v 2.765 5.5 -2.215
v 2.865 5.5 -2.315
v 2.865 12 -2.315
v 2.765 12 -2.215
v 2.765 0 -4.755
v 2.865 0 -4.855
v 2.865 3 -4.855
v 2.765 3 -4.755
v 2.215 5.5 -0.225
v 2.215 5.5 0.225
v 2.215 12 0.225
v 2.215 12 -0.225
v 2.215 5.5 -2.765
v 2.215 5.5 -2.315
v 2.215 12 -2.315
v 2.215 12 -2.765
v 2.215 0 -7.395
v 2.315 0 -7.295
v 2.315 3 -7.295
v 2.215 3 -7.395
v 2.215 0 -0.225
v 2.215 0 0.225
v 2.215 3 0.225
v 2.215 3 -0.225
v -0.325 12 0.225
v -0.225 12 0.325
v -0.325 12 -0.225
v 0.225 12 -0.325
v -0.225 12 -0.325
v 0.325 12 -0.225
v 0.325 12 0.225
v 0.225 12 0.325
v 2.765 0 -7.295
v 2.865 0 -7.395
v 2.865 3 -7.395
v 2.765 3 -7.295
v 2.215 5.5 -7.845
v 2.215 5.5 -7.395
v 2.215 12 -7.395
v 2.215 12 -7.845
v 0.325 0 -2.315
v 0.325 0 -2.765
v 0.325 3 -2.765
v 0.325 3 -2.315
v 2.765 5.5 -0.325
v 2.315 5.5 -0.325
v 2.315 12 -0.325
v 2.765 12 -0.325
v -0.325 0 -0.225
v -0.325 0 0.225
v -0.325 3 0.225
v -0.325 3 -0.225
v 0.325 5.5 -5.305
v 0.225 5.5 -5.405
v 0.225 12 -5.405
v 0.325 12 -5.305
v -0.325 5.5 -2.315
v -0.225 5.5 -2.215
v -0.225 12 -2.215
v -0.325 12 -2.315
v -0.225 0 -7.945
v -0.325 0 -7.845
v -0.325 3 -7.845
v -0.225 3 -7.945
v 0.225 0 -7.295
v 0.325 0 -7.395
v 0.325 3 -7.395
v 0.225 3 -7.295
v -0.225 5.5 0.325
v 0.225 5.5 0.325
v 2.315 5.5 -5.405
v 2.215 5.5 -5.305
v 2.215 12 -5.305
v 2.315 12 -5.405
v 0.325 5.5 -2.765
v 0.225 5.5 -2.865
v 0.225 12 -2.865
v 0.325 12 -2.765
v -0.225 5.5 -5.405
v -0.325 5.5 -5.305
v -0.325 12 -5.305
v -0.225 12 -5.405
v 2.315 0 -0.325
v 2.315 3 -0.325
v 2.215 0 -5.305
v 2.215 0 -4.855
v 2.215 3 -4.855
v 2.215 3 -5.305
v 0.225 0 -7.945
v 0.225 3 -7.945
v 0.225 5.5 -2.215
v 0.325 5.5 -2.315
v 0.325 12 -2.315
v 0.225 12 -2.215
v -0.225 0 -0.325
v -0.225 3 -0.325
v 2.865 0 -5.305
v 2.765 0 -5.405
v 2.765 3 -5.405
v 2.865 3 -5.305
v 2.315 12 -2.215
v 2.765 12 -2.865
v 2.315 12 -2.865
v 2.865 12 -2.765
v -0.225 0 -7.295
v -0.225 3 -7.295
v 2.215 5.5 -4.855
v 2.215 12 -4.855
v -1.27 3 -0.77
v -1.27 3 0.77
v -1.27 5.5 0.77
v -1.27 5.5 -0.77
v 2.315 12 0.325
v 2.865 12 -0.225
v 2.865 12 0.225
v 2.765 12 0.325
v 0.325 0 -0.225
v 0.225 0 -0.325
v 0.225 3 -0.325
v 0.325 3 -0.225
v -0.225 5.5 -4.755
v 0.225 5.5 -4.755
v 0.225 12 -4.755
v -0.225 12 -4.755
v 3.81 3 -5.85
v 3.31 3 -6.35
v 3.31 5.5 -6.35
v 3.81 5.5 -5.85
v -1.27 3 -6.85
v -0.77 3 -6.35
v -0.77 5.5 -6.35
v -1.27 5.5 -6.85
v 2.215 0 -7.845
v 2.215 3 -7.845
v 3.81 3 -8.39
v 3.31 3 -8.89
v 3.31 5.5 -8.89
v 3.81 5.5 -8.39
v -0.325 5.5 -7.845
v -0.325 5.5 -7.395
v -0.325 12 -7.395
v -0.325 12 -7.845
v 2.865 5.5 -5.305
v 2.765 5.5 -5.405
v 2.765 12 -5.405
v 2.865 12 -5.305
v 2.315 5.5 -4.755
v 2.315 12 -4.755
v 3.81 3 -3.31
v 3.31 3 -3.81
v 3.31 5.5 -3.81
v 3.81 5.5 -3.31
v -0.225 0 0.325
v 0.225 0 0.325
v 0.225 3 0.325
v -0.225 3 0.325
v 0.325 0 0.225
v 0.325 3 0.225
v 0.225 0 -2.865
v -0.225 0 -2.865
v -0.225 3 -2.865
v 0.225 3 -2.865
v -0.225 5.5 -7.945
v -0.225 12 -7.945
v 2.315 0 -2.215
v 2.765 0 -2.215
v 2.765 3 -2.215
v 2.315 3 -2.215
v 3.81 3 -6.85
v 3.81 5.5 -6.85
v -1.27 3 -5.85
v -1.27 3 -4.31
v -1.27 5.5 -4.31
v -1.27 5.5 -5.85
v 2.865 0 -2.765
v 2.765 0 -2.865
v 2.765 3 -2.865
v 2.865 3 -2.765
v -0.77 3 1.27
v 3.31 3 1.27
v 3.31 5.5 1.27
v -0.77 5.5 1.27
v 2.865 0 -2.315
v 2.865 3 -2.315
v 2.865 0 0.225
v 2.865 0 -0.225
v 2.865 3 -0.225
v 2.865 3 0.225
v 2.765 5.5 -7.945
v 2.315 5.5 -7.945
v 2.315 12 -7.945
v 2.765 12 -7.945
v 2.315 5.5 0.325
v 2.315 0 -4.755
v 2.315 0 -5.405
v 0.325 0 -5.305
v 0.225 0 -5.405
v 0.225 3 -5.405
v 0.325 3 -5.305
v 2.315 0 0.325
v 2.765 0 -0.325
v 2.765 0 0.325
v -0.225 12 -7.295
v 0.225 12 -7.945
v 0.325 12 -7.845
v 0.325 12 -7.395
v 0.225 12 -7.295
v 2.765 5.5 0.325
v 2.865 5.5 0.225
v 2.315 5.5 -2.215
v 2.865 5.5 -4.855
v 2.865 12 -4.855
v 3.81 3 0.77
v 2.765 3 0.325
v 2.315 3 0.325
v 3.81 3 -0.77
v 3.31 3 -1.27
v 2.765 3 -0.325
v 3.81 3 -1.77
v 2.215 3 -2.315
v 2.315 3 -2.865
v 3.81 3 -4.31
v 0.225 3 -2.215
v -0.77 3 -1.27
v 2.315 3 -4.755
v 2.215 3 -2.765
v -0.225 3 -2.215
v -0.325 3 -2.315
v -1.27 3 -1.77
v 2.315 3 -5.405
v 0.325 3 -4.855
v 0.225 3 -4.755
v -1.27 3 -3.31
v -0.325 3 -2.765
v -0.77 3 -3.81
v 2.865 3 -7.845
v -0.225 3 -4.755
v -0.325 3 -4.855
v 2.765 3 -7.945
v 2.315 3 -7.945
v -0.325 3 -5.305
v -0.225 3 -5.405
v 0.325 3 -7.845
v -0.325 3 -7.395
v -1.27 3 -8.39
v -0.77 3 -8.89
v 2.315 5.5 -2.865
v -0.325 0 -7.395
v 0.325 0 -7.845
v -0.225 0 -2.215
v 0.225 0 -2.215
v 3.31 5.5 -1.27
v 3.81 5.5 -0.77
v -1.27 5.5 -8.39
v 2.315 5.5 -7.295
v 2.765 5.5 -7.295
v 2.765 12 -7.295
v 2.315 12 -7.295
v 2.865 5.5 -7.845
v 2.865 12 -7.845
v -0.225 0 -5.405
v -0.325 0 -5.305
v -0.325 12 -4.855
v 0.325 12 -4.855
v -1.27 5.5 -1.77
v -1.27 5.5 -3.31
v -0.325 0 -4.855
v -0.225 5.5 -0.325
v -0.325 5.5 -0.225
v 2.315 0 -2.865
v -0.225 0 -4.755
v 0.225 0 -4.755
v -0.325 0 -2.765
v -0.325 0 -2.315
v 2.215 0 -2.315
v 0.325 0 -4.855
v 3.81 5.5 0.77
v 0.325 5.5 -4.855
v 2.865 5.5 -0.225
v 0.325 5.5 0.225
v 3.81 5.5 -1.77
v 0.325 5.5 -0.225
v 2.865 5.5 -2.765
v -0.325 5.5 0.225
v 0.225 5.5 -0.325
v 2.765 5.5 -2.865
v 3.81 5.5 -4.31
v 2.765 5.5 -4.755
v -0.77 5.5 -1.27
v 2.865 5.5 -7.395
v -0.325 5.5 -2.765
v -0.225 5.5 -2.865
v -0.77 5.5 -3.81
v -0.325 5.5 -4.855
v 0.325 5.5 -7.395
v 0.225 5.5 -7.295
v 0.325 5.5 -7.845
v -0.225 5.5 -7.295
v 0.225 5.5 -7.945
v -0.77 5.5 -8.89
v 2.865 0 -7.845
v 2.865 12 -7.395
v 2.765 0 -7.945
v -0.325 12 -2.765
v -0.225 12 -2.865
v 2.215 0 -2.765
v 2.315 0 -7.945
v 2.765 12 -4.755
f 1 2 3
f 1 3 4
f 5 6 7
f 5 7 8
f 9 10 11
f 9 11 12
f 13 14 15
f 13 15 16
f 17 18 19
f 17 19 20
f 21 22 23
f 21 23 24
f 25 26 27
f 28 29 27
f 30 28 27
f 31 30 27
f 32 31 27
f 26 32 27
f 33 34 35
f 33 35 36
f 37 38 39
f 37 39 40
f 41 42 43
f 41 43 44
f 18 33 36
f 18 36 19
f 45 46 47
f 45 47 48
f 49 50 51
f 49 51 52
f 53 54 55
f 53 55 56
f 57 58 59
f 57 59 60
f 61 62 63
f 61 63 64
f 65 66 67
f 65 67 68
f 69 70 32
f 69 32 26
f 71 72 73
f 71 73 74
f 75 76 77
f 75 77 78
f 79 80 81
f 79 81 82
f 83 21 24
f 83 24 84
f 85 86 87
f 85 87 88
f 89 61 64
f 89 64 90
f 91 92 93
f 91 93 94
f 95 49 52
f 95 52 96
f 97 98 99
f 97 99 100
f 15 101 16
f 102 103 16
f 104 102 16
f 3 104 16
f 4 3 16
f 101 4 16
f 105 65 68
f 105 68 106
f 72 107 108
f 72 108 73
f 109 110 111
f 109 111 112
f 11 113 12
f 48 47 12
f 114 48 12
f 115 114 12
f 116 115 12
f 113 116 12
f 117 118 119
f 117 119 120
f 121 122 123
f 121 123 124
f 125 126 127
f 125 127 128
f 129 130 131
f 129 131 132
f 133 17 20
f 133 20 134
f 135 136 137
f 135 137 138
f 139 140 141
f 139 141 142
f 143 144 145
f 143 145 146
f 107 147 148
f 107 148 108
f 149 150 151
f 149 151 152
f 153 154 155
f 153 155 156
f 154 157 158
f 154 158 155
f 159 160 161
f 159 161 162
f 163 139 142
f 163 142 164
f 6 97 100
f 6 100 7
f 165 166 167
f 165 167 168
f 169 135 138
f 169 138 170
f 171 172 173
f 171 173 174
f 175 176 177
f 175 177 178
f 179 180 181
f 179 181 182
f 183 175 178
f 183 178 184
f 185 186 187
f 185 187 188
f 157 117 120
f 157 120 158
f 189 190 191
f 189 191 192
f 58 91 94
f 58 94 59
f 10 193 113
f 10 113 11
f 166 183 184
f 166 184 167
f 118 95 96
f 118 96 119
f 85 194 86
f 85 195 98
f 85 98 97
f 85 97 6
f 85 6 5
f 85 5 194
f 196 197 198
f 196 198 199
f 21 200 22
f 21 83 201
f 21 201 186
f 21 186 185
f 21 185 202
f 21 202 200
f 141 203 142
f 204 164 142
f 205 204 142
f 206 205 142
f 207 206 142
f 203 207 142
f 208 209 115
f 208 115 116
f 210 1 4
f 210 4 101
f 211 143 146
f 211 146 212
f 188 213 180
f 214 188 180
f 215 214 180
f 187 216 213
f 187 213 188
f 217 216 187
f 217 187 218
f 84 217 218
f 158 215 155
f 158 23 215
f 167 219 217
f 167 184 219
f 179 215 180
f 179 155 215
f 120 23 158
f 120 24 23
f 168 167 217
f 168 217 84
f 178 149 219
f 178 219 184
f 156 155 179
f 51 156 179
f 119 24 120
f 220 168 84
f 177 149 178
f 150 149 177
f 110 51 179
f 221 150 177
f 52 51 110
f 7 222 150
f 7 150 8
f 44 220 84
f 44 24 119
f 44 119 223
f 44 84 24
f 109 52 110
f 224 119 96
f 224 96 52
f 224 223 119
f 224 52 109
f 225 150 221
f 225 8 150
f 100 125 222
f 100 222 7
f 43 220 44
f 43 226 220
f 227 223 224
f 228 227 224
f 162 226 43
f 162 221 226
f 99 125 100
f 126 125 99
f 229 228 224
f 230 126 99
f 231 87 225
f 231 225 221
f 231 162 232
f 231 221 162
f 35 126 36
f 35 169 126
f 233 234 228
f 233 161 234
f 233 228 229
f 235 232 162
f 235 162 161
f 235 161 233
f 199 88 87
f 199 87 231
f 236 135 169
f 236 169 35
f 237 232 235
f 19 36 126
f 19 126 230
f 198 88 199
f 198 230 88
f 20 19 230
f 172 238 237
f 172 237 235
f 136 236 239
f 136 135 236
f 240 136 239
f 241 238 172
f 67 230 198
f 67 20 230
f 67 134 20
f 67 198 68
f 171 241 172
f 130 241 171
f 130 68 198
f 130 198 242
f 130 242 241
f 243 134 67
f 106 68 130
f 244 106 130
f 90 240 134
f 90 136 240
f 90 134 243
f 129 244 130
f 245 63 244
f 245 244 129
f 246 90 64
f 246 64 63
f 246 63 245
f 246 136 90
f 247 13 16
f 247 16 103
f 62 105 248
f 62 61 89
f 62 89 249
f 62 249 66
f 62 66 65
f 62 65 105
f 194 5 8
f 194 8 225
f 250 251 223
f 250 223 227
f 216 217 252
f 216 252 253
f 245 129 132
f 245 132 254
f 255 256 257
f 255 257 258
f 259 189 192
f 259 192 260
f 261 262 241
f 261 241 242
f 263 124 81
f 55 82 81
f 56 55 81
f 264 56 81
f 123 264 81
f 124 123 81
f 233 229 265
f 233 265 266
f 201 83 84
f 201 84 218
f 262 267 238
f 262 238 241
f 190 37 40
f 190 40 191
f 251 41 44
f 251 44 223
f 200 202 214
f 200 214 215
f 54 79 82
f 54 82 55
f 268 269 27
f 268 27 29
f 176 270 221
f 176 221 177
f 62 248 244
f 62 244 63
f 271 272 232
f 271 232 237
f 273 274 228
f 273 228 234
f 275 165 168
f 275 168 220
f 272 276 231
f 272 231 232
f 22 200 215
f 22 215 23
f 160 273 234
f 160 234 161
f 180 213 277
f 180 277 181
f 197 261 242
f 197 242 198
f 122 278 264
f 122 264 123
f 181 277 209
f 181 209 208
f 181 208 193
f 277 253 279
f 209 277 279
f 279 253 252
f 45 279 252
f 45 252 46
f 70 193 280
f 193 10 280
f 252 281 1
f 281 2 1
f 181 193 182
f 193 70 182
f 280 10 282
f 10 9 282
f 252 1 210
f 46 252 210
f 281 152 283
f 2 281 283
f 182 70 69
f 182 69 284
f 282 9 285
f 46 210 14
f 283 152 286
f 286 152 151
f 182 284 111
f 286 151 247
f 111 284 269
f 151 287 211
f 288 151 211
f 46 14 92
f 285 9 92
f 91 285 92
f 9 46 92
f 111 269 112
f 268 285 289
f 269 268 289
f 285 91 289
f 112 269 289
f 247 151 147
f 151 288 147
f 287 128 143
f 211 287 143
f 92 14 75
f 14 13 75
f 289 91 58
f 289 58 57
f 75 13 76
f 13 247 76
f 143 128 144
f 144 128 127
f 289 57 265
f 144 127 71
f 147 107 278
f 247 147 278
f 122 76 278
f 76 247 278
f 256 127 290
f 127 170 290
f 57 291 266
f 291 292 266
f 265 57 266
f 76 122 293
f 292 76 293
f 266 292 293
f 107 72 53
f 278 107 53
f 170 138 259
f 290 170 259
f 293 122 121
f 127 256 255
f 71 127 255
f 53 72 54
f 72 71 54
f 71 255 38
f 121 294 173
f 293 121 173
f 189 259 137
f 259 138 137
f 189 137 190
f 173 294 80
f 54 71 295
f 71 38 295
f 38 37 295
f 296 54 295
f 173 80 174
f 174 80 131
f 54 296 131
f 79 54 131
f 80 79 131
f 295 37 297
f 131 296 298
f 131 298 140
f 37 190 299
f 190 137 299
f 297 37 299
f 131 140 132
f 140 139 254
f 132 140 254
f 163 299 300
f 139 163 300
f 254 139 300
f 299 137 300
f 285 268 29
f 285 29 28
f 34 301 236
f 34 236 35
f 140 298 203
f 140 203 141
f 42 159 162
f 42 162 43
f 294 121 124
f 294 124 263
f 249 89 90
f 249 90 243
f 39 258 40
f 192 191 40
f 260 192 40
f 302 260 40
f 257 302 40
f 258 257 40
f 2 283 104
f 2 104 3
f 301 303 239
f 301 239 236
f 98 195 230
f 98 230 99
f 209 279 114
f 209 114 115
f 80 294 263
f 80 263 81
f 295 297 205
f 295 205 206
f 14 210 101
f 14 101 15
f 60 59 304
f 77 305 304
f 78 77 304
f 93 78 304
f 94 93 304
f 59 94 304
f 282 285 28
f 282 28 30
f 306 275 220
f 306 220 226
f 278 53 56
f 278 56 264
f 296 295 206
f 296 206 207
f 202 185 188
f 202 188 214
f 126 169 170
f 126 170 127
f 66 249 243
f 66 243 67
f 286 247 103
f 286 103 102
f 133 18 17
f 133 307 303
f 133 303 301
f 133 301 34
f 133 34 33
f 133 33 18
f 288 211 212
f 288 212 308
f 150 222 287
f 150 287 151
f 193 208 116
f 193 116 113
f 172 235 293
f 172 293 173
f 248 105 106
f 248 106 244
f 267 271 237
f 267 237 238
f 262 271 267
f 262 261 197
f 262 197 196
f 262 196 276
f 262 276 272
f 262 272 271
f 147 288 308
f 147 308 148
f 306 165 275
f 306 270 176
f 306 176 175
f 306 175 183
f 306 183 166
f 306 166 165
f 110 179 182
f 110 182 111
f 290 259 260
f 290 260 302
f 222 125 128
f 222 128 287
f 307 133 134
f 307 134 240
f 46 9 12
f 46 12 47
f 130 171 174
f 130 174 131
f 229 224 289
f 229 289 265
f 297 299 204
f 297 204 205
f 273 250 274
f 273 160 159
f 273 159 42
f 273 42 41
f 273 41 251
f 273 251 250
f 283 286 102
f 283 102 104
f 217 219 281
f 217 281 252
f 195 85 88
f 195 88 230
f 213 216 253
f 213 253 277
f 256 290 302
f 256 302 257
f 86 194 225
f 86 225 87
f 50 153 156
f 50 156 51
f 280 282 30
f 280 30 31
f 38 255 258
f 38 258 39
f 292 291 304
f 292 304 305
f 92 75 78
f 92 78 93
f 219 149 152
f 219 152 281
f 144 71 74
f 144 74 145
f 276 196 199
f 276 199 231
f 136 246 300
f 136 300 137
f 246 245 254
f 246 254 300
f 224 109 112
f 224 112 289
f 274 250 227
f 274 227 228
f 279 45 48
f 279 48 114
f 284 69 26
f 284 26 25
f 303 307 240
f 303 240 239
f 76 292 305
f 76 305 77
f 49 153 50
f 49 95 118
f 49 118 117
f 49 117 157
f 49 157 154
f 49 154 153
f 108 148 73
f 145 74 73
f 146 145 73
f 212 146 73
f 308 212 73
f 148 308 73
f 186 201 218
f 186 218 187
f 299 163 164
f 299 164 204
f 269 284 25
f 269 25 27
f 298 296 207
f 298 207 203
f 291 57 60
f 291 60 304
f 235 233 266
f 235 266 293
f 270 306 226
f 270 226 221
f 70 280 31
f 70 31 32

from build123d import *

# Parameters (mm, degrees)
EXTRUDE_1_DEPTH        = 12
PATTERN_LINEAR_1_COUNT = 2
PATTERN_LINEAR_1_PITCH = 2.54
EXTRUDE_2_DEPTH        = 2.5
PATTERN_LINEAR_2_COUNT = 4
PATTERN_LINEAR_2_PITCH = 2.54


with BuildPart() as part:
    # 草图1 → 凸台-拉伸1 (new body)
    with BuildSketch(Plane(origin=(0, 0, 0), x_dir=(1, 0, 0), z_dir=(0, 1, 0))):
        Polygon((-0.225, -0.325), (-0.325, -0.225), (-0.325, 0.225), (-0.225, 0.325), (0.225, 0.325), (0.325, 0.225), (0.325, -0.225), (0.225, -0.325), align=None)
    extrude(amount=EXTRUDE_1_DEPTH)


with BuildPart() as pattern_linear_1_1:
    # 阵列(线性)1: pattern copy
    add(part.part.moved(Location(Vector(1, 0, 0) * (1 * PATTERN_LINEAR_1_PITCH))))


with BuildPart() as part_1:
    add(part.part)

    add(pattern_linear_1_1.part)  # 凸台-拉伸2 merges 阵列(线性)1_1
    # 草图2 → 凸台-拉伸2 (add)
    with BuildSketch(Plane(origin=(0, 3, 0), x_dir=(-1, 0, 0), z_dir=(0, -1, 0))):
        Polygon((-3.31, 1.27), (-3.81, 0.77), (-3.81, -0.77), (-3.31, -1.27), (0.77, -1.27), (1.27, -0.77), (1.27, 0.77), (0.77, 1.27), align=None)
    extrude(amount=-EXTRUDE_2_DEPTH)


with BuildPart() as pattern_linear_2_1:
    # 阵列(线性)2: pattern copy
    add(part_1.part.moved(Location(Vector(0, 0, -1) * (1 * PATTERN_LINEAR_2_PITCH))))


with BuildPart() as pattern_linear_2_2:
    # 阵列(线性)2: pattern copy
    add(part_1.part.moved(Location(Vector(0, 0, -1) * (2 * PATTERN_LINEAR_2_PITCH))))


with BuildPart() as pattern_linear_2_3:
    # 阵列(线性)2: pattern copy
    add(part_1.part.moved(Location(Vector(0, 0, -1) * (3 * PATTERN_LINEAR_2_PITCH))))


with BuildPart() as part_2:
    add(part_1.part)

    # Combine 1: union 阵列(线性)2_1, 阵列(线性)2_2, 阵列(线性)2_3
    add(pattern_linear_2_1.part)
    add(pattern_linear_2_2.part)
    add(pattern_linear_2_3.part)


solid = part_2.part
